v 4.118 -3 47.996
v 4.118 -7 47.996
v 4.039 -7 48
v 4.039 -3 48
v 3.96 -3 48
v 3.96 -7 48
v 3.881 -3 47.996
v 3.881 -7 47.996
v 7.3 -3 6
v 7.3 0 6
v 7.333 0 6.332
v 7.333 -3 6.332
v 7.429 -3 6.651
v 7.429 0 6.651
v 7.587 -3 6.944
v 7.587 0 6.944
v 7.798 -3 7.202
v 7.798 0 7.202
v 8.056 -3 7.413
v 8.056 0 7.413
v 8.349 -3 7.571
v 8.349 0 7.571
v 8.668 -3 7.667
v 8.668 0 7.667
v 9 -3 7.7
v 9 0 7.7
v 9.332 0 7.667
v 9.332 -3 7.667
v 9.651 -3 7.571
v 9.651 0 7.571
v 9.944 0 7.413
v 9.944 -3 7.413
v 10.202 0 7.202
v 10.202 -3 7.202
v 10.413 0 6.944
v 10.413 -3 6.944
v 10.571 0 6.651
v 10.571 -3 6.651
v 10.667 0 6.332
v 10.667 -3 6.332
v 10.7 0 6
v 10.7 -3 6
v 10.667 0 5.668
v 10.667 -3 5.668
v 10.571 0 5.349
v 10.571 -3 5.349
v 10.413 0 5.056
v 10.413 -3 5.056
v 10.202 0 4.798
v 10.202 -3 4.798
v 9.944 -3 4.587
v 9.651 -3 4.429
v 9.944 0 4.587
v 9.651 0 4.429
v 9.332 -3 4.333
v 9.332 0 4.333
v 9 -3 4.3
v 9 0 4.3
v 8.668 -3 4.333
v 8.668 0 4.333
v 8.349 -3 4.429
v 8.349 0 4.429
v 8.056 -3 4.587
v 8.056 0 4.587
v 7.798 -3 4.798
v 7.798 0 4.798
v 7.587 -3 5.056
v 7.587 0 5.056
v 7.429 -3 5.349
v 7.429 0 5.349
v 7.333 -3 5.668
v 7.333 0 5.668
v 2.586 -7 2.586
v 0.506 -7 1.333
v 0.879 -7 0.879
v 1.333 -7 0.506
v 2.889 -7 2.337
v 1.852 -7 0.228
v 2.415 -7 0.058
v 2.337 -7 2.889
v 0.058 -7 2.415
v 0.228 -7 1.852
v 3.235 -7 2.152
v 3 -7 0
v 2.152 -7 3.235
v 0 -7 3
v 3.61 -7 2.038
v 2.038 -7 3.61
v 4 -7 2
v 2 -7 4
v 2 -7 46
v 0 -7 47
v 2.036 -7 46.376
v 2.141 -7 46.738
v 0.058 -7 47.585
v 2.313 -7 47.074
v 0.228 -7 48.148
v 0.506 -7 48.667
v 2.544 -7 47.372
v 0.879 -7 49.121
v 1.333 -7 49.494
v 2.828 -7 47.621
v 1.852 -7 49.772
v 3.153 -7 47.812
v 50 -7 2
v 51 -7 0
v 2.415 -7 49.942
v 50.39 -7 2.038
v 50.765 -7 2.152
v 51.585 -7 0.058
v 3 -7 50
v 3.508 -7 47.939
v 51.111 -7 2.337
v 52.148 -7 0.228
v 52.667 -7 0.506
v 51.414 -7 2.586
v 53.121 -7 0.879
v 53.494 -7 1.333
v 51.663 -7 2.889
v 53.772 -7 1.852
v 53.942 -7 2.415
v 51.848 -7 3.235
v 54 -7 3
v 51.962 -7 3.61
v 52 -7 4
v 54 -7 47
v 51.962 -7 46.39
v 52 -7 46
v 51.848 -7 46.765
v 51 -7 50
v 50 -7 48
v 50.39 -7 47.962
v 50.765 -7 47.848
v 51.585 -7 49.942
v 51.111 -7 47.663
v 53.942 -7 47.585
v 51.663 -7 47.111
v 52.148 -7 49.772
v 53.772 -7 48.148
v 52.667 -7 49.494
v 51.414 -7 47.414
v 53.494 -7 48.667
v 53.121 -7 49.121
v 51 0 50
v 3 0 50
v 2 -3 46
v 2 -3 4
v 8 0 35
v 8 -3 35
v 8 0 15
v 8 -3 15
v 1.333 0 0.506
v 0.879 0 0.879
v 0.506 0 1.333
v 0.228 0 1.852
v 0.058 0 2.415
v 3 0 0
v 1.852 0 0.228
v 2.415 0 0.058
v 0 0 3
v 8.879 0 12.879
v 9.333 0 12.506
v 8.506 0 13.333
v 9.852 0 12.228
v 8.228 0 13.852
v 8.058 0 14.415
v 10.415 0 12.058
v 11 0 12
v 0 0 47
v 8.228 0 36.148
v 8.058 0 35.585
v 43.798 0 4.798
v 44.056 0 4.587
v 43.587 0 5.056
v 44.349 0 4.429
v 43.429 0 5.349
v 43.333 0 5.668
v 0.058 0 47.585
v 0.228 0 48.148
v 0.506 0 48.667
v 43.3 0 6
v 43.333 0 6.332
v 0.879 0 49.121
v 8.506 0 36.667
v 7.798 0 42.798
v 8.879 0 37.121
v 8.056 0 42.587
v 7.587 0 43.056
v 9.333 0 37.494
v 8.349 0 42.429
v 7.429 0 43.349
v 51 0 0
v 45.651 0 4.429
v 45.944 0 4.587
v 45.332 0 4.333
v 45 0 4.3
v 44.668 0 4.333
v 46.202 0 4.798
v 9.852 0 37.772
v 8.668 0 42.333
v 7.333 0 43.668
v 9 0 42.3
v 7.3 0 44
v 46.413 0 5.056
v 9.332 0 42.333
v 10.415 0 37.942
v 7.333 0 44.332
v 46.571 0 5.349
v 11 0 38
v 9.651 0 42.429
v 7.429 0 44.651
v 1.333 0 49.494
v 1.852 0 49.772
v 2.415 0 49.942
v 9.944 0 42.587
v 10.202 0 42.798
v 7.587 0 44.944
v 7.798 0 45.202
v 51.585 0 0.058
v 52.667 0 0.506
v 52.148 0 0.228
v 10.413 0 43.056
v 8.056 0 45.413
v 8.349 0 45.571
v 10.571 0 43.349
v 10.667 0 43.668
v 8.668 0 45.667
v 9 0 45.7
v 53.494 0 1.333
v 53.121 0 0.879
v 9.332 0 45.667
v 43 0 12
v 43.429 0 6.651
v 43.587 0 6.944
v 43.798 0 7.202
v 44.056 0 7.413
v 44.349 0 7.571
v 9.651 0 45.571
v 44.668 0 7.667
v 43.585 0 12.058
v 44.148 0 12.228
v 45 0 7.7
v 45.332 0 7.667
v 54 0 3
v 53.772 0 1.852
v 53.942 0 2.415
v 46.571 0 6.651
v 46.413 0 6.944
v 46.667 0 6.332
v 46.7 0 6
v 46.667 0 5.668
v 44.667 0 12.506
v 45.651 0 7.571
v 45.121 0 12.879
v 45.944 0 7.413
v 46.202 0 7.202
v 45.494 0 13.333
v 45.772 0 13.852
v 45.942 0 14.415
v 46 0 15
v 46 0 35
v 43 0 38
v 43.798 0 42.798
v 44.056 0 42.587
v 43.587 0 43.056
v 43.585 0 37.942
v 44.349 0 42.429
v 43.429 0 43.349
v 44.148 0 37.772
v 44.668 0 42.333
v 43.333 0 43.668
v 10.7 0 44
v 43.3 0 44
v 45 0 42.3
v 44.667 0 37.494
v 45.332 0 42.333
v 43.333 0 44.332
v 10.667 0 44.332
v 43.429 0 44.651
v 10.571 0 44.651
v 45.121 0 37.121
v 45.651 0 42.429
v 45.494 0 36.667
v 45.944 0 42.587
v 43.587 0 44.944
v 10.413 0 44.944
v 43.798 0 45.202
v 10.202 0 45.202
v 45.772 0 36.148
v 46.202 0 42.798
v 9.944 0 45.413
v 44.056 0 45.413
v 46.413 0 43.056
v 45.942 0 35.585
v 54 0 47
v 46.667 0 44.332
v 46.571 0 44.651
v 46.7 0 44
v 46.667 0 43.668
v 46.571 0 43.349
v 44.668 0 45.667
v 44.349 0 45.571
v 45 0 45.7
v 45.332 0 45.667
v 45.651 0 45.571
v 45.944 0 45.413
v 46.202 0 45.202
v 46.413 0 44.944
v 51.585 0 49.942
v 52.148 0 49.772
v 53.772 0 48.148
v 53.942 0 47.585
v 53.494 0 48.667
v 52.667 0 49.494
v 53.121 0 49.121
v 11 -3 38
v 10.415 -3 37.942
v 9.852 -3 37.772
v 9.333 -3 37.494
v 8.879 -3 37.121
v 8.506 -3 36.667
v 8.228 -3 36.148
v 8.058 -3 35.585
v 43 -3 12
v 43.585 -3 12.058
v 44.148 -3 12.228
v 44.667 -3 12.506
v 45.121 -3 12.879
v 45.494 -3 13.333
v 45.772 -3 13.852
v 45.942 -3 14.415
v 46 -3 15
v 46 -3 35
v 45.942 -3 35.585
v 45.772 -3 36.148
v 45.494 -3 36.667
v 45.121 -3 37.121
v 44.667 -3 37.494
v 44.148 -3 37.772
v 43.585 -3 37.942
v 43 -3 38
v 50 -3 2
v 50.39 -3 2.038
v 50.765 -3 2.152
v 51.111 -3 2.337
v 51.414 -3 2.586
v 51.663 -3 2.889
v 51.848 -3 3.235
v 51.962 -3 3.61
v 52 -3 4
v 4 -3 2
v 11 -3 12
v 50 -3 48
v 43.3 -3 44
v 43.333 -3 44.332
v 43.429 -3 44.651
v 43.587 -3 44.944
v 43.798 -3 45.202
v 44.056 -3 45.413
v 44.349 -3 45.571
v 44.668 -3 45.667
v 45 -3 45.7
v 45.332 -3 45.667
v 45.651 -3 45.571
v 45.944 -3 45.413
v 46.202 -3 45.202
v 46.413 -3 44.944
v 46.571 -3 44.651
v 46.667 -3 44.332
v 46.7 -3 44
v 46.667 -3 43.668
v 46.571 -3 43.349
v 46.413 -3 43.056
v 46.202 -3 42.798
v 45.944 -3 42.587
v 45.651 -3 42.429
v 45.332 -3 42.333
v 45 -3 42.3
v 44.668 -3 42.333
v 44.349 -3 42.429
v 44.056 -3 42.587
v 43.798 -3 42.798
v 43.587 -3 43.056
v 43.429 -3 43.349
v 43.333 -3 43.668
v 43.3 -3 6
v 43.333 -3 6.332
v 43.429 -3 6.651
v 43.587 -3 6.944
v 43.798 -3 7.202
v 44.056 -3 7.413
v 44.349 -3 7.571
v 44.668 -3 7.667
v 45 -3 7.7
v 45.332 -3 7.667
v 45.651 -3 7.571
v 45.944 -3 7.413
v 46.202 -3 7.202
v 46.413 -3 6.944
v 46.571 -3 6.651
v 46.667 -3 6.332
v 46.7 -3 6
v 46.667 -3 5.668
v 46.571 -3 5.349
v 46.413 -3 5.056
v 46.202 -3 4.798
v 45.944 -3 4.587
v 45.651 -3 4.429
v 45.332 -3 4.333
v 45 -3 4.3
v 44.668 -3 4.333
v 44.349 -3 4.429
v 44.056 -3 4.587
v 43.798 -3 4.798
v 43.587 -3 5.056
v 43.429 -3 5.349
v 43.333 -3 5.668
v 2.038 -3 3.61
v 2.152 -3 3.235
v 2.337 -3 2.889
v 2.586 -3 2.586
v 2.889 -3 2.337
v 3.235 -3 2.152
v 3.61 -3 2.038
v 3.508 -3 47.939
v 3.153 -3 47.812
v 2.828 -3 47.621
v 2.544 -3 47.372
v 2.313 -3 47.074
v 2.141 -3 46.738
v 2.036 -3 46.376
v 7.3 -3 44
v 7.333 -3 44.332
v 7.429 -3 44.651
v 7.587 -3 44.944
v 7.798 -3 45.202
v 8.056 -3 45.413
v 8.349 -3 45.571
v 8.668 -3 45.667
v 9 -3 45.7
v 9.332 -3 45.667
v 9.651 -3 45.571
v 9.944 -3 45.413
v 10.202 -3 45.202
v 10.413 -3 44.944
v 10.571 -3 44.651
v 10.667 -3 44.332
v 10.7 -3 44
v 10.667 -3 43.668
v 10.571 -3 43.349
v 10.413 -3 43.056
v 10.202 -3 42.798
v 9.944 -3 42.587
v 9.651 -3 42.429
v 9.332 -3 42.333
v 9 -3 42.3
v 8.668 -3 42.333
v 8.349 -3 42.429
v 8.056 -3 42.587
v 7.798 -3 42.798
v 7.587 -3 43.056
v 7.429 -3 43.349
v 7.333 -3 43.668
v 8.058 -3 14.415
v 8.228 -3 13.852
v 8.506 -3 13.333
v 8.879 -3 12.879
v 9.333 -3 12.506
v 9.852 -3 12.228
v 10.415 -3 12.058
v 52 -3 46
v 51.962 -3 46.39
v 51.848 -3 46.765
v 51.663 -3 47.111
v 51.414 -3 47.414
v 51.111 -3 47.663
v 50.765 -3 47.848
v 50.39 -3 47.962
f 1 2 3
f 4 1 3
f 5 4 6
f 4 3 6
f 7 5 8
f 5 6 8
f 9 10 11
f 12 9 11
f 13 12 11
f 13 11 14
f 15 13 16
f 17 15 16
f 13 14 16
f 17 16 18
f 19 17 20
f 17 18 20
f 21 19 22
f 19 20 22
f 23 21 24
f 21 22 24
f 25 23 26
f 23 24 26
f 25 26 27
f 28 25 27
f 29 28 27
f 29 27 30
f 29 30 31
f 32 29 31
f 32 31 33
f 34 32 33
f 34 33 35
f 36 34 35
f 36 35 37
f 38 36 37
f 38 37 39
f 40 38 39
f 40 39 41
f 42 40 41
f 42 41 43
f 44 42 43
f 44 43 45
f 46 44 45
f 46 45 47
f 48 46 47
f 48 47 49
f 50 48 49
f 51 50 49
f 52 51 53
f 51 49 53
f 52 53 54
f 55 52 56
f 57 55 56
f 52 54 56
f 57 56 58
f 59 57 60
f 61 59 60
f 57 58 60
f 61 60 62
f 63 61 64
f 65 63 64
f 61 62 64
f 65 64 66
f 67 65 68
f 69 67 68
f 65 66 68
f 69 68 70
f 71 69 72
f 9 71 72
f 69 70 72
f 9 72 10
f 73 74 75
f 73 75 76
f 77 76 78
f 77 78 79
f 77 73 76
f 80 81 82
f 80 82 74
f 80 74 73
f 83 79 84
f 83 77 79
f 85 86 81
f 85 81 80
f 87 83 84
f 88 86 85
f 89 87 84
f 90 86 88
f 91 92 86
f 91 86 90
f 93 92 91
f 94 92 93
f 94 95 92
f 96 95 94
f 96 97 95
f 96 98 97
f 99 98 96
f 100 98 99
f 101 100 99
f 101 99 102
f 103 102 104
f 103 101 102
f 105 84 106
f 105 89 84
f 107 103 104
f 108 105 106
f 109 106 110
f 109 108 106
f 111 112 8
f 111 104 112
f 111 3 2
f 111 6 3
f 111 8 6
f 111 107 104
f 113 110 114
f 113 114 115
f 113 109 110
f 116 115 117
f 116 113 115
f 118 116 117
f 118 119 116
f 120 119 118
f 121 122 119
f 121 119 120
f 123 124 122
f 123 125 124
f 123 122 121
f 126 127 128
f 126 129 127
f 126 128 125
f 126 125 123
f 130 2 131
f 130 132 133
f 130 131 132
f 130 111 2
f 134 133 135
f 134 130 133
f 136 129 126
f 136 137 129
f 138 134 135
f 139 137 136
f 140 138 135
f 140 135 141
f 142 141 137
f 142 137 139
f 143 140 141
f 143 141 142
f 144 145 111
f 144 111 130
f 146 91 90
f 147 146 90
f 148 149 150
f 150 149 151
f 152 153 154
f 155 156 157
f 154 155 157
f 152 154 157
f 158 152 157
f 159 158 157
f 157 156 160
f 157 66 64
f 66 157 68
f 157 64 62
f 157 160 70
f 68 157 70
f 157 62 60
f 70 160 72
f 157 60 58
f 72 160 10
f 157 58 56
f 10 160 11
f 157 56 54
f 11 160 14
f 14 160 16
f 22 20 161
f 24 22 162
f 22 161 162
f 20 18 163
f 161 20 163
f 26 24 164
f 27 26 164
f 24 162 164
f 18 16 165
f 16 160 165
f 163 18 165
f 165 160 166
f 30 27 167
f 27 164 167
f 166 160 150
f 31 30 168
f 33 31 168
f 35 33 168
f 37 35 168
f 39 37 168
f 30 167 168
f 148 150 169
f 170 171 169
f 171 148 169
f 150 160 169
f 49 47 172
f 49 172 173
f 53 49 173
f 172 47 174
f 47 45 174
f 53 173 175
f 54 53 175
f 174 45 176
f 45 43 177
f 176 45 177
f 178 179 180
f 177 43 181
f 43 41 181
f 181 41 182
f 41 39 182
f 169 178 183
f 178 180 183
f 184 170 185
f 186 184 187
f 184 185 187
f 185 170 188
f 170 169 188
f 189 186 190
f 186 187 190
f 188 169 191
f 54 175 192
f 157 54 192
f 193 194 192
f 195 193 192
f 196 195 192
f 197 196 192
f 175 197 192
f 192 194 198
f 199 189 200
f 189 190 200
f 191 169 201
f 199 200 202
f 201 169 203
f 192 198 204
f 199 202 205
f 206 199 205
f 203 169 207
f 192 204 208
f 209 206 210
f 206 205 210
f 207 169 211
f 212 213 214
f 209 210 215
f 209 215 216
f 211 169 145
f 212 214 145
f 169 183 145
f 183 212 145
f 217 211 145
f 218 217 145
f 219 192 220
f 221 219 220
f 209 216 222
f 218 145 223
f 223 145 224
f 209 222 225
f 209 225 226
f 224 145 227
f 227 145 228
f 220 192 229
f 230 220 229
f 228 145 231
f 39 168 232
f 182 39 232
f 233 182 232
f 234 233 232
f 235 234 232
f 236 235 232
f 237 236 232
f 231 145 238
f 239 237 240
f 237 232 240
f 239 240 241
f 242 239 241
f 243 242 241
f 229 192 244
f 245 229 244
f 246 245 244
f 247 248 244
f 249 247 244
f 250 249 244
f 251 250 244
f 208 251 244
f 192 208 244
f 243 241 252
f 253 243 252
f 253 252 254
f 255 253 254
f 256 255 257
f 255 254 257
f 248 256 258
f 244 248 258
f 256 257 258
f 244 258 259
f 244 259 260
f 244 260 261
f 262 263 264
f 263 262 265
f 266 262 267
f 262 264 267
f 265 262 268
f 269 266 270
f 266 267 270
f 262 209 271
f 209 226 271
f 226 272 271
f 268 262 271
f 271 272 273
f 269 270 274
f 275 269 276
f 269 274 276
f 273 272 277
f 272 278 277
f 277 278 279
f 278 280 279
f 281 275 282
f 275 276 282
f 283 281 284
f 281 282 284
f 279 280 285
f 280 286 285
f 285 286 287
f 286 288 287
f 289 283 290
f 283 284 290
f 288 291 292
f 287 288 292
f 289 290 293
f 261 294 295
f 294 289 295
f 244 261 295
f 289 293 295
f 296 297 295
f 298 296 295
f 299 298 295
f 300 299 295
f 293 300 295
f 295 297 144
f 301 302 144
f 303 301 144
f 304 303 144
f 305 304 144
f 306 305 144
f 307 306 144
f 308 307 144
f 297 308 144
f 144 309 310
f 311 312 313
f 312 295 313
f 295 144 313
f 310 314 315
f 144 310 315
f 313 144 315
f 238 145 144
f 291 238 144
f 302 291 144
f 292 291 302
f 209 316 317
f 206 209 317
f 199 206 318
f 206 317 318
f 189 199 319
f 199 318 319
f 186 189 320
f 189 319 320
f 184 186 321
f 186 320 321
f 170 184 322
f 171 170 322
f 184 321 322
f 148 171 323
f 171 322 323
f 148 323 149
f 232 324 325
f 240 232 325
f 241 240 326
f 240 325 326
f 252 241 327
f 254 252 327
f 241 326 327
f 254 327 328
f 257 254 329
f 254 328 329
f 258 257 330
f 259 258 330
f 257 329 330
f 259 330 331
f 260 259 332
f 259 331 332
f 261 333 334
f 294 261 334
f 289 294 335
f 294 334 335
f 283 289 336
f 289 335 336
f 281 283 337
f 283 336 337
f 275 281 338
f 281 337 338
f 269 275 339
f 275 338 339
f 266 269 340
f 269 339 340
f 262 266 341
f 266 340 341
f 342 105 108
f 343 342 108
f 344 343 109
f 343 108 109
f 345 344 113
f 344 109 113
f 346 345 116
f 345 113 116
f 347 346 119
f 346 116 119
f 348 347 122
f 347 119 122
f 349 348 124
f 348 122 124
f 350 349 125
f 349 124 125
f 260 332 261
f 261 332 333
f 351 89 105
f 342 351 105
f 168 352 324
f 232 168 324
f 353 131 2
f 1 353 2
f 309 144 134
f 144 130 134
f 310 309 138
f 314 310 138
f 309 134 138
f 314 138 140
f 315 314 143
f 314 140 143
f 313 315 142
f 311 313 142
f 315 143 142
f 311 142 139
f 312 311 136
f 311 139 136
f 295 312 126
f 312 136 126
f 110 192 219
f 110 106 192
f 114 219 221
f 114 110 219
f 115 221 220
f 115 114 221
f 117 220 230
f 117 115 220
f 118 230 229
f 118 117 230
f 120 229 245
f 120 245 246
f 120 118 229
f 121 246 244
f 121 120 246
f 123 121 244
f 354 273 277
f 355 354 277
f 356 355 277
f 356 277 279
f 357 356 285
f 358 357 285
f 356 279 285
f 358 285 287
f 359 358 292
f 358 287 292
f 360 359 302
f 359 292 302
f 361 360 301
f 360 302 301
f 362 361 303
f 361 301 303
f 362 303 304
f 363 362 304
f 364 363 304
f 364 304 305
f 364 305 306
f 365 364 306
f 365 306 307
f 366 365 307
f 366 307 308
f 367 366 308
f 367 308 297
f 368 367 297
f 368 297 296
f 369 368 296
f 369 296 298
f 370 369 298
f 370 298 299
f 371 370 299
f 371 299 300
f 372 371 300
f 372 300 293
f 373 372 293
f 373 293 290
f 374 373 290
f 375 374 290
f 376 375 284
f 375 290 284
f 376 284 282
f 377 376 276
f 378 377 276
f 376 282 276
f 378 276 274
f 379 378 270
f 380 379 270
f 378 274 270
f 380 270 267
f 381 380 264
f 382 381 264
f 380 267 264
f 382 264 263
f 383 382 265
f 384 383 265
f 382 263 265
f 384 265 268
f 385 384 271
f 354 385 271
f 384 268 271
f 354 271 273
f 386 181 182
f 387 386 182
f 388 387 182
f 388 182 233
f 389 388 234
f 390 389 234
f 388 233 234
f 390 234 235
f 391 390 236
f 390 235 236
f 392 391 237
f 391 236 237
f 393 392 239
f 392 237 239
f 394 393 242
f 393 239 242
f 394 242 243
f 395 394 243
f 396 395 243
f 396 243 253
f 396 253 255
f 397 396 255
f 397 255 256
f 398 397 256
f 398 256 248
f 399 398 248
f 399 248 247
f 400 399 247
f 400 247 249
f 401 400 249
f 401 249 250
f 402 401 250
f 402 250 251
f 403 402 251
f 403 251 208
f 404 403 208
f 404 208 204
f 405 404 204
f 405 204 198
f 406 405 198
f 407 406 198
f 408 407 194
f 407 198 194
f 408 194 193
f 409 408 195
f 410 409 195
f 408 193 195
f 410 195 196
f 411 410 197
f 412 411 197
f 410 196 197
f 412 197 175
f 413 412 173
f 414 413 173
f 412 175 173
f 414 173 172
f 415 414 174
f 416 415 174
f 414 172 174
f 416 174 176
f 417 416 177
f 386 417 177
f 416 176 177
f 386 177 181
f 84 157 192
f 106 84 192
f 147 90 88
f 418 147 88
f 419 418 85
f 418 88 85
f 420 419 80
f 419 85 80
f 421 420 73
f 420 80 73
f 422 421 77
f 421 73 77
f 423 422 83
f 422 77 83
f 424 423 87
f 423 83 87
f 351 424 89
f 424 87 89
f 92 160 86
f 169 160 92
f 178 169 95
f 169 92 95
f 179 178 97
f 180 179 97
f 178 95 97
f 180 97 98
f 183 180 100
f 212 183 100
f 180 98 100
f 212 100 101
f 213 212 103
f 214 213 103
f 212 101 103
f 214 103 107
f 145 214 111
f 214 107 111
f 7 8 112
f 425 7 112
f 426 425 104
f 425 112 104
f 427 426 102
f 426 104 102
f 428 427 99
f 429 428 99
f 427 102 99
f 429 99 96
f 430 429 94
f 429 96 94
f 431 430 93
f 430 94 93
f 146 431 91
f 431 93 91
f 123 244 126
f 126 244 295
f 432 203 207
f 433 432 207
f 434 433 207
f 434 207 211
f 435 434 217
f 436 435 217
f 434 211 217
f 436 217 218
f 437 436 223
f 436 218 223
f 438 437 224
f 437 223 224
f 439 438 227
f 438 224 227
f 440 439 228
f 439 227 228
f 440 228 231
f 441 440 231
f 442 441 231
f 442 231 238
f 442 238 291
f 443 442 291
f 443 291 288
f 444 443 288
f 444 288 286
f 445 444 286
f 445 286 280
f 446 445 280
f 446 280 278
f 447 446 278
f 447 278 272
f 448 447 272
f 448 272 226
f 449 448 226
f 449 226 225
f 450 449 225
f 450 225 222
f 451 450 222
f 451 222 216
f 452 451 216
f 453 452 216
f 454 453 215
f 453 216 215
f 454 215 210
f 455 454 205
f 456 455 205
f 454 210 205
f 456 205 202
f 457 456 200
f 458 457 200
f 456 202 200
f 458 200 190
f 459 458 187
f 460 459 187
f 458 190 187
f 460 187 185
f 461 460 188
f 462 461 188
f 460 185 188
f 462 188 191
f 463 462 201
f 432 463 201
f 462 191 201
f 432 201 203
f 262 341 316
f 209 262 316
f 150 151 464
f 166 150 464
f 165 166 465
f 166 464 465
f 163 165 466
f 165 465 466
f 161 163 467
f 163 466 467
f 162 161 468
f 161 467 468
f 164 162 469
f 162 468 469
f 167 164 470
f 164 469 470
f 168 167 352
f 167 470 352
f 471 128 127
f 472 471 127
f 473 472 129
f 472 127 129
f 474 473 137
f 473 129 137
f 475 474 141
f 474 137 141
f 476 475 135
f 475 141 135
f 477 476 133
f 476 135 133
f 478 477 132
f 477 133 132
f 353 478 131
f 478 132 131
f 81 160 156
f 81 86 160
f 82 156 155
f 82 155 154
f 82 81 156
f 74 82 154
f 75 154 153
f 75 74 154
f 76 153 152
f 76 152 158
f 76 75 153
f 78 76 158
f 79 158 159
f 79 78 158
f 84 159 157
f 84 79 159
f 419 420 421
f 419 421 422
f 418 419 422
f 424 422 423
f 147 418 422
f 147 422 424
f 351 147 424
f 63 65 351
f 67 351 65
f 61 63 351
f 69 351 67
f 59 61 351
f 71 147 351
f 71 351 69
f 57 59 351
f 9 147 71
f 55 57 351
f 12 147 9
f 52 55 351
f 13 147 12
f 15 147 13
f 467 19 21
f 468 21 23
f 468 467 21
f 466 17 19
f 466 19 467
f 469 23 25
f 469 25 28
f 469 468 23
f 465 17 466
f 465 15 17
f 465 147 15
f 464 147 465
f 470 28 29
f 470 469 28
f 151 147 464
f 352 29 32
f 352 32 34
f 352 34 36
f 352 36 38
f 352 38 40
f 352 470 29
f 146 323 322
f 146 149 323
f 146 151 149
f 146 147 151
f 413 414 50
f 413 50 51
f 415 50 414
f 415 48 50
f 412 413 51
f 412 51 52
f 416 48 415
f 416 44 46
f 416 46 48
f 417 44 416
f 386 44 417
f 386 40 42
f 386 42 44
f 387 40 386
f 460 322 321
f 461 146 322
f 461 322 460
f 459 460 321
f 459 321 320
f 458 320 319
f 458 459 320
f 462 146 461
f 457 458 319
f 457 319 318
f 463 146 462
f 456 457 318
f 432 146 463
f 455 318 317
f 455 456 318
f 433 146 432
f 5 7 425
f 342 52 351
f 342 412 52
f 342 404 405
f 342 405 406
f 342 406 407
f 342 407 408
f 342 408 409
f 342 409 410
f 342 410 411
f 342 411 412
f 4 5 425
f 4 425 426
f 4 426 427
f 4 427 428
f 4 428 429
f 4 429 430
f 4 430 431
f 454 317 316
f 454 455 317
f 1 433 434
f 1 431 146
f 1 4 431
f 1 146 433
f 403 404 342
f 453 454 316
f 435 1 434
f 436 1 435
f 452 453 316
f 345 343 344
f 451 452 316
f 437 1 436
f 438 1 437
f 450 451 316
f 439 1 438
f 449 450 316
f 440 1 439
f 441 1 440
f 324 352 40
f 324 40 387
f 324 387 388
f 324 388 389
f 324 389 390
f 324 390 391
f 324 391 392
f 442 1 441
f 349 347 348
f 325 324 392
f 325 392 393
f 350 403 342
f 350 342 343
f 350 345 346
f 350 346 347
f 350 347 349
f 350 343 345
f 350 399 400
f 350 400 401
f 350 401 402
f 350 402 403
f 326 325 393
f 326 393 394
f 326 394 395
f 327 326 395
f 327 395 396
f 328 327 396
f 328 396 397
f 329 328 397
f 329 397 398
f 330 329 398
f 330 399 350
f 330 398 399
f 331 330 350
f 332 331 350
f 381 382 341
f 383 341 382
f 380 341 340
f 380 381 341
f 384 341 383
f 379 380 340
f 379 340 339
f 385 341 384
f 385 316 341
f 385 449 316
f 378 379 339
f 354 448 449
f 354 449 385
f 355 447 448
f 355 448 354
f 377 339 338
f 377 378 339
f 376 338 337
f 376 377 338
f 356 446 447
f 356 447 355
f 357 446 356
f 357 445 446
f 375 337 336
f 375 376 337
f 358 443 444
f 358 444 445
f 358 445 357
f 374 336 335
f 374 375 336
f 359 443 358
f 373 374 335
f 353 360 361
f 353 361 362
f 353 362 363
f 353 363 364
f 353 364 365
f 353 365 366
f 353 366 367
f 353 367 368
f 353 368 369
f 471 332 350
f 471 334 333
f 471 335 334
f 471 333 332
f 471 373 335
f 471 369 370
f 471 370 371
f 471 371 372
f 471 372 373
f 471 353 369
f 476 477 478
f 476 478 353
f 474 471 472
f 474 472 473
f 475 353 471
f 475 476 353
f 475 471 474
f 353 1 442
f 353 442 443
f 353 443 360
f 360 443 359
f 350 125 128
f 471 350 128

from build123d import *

# Parameters (mm, degrees)
F0_W     = 54
F0_H     = 50
F1_DEPTH = 7
F3_D     = 3.4
F5_DEPTH = 25
F7_DEPTH = 4
F8_R     = 3


with BuildPart() as f1:
    # F0 (on Front) → F1 (new body)
    with BuildSketch(Plane.XZ):
        with Locations((27, 25)):
            Rectangle(F0_W, F0_H)
    extrude(amount=F1_DEPTH)

    # F3 (through all)
    with Locations(Plane.XZ.offset(7)):
        with Locations((9, 44), (45, 44), (9, 6), (45, 6)):
            Hole(F3_D / 2)

    # F4 (on face) → F5 (cut)
    with BuildSketch(Plane.XZ.offset(7)):
        with BuildLine():
            Line((43, 38), (11, 38))
            ThreePointArc((11, 38), (8.8786796564, 37.1213203436), (8, 35))
            Line((8, 35), (8, 15))
            ThreePointArc((8, 15), (8.8786796564, 12.8786796564), (11, 12))
            Line((11, 12), (43, 12))
            ThreePointArc((43, 12), (45.1213203436, 12.8786796564), (46, 15))
            Line((46, 15), (46, 35))
            ThreePointArc((46, 35), (45.1213203436, 37.1213203436), (43, 38))
        make_face()
    extrude(amount=-F5_DEPTH, mode=Mode.SUBTRACT)

    # F6 (on face) → F7 (cut)
    with BuildSketch(Plane.XZ.offset(7)):
        with BuildLine():
            Line((4.1184528013, 47.9964891519), (3.881241658, 47.9964710006))
            ThreePointArc((3.881241658, 47.9964710006), (2.5444044717, 47.3715836314), (2, 46))
            ThreePointArc((2, 46), (4, 44), (6, 46))
            ThreePointArc((6, 46), (5.4554905707, 47.3716950093), (4.1184528013, 47.9964891519))
        make_face()
        with BuildLine():
            ThreePointArc((4.1184528013, 47.9964891519), (3.9998469603, 47.9999999941), (3.881241658, 47.9964710006))
            Line((3.881241658, 47.9964710006), (4.1184528013, 47.9964891519))
        make_face()
        with BuildLine():
            ThreePointArc((6, 46), (4, 44), (2, 46))
            Line((2, 46), (2, 4))
            ThreePointArc((2, 4), (4, 6), (6, 4))
            ThreePointArc((6, 4), (5.4142135624, 2.5857864376), (4, 2))
            Line((4, 2), (50, 2))
            ThreePointArc((50, 2), (48.5857864376, 5.4142135624), (52, 4))
            Line((52, 4), (52, 46))
            ThreePointArc((52, 46), (48.5857864376, 44.5857864376), (50, 48))
            Line((50, 48), (4.1184528013, 47.9964891519))
            ThreePointArc((4.1184528013, 47.9964891519), (5.4554905707, 47.3716950093), (6, 46))
        make_face()
        with BuildLine():
            Line((4, 2), (2, 4))
            ThreePointArc((2, 4), (2.5857864376, 2.5857864376), (4, 2))
        make_face()
        with BuildLine():
            ThreePointArc((6, 4), (4, 6), (2, 4))
            Line((2, 4), (4, 2))
            ThreePointArc((4, 2), (5.4142135624, 2.5857864376), (6, 4))
        make_face()
        with BuildLine():
            Line((52, 46), (50, 48))
            ThreePointArc((50, 48), (48.5857864376, 44.5857864376), (52, 46))
        make_face()
        with BuildLine():
            ThreePointArc((52, 46), (51.4142135624, 47.4142135624), (50, 48))
            Line((50, 48), (52, 46))
        make_face()
        with BuildLine():
            Line((52, 4), (50, 2))
            ThreePointArc((50, 2), (51.4142135624, 2.5857864376), (52, 4))
        make_face()
        with BuildLine():
            ThreePointArc((52, 4), (48.5857864376, 5.4142135624), (50, 2))
            Line((50, 2), (52, 4))
        make_face()
    extrude(amount=-F7_DEPTH, mode=Mode.SUBTRACT)

    # F8
    f8_edges = [f1.edges().sort_by_distance(p)[0] for p in [
        (54, -3.5, 50),
        (54, -3.5, 0),
        (0, -3.5, 0),
        (0, -3.5, 50),
    ]]
    fillet(f8_edges, radius=F8_R)


solid = f1.part
